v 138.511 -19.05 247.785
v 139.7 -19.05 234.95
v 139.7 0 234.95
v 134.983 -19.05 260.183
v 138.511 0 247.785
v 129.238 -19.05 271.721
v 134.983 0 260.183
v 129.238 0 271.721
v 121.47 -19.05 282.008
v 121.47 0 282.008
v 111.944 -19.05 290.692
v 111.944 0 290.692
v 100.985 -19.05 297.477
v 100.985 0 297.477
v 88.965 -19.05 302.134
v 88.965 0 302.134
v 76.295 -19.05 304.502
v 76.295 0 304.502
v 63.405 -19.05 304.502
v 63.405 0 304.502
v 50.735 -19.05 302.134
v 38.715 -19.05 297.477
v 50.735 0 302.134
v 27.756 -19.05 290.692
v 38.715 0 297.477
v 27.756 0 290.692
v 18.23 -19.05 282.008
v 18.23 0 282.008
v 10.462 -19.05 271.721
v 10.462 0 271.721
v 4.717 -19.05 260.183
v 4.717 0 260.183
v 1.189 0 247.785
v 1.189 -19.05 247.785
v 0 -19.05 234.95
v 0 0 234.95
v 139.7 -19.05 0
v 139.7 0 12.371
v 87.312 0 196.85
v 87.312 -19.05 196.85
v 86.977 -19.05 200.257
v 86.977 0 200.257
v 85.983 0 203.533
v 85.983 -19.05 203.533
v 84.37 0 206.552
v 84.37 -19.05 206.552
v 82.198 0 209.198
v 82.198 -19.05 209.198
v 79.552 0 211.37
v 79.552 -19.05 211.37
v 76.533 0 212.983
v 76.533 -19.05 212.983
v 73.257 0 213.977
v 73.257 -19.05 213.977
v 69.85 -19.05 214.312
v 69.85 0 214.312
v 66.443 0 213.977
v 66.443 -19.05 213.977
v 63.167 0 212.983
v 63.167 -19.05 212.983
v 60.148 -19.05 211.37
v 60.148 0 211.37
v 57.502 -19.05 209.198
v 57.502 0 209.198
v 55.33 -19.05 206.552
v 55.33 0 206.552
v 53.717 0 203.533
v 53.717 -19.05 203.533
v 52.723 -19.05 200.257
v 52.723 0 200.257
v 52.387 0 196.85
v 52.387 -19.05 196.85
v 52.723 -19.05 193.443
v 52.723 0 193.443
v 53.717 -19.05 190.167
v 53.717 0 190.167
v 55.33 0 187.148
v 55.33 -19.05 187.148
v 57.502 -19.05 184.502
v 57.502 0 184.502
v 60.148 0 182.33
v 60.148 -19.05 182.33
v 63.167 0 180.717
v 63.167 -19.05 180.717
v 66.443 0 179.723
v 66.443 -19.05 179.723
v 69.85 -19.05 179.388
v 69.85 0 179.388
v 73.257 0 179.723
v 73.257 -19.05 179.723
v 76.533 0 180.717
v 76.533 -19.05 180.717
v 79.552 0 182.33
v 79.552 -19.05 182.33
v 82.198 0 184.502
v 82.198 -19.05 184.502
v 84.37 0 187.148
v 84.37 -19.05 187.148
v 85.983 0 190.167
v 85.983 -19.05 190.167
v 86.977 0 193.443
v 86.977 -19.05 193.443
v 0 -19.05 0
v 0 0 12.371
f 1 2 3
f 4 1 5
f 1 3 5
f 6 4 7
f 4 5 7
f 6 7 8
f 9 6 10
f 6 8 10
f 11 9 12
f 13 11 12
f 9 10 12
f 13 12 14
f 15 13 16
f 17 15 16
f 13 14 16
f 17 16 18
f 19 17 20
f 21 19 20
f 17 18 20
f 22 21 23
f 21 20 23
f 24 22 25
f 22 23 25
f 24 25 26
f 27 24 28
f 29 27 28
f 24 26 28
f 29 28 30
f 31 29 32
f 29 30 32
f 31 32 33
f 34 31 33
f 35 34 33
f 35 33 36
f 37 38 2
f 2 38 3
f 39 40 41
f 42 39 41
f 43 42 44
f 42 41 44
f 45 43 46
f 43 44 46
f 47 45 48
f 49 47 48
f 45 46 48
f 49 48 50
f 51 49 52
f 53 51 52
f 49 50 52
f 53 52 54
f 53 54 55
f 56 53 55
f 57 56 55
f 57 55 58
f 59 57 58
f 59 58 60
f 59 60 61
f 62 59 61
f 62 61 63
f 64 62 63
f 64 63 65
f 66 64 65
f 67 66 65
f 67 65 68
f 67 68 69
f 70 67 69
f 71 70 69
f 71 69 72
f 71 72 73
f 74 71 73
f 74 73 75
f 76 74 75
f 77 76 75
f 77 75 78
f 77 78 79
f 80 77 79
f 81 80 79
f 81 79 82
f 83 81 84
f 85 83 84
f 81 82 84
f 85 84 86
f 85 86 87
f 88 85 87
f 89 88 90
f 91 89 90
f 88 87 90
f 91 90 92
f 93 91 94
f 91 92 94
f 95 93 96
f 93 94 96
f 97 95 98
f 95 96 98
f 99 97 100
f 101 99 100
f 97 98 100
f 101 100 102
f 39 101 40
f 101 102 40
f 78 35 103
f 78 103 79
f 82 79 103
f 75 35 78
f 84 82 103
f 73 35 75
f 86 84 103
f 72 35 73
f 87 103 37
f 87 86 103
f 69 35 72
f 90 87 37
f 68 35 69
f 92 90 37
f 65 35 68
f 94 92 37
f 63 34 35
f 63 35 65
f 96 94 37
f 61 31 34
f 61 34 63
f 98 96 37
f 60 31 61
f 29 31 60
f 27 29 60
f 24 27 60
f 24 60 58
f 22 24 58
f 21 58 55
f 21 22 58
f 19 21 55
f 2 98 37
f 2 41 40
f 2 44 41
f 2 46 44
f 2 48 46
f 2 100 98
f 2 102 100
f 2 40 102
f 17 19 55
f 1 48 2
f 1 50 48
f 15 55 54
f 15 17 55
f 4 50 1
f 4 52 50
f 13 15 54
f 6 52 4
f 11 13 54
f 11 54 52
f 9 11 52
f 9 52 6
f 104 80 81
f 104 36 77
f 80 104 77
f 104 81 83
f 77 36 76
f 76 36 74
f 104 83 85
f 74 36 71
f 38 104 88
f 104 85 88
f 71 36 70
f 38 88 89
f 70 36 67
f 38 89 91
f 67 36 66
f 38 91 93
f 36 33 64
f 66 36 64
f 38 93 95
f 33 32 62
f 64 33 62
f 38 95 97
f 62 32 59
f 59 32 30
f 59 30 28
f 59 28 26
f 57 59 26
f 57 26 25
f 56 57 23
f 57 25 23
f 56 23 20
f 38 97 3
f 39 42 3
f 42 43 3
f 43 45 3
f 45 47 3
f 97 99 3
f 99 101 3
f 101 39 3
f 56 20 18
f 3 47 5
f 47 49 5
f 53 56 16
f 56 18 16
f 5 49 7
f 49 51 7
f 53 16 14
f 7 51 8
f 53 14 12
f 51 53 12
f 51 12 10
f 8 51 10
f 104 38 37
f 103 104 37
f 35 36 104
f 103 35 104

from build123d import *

# Parameters (mm, degrees)
F1_DEPTH = 19.05
F3_DEPTH = 139.701
F4_R     = 17.4625
F5_DEPTH = 19.051


with BuildPart() as f1:
    # F0 (on Front) → F1 (new body)
    with BuildSketch(Plane.XZ):
        with BuildLine():
            Line((0, 234.95), (0, 0))
            Line((0, 0), (139.7, 0))
            Line((139.7, 0), (139.7, 234.95))
            ThreePointArc((139.7, 234.95), (69.85, 304.8), (0, 234.95))
        make_face()
    extrude(amount=F1_DEPTH)

    # F2 (on face) → F3 (cut, through all)
    with BuildSketch(Plane.YZ.offset(139.7)):
        Polygon((0, 12.371215), (-19.05, 0), (0, 0), align=None)
    extrude(amount=-F3_DEPTH, mode=Mode.SUBTRACT)

    # F4 (on face) → F5 (cut, through all)
    with BuildSketch(Plane.XZ.offset(19.05)):
        with Locations((69.85, 196.85)):
            Circle(F4_R)
    extrude(amount=-F5_DEPTH, mode=Mode.SUBTRACT)


solid = f1.part
